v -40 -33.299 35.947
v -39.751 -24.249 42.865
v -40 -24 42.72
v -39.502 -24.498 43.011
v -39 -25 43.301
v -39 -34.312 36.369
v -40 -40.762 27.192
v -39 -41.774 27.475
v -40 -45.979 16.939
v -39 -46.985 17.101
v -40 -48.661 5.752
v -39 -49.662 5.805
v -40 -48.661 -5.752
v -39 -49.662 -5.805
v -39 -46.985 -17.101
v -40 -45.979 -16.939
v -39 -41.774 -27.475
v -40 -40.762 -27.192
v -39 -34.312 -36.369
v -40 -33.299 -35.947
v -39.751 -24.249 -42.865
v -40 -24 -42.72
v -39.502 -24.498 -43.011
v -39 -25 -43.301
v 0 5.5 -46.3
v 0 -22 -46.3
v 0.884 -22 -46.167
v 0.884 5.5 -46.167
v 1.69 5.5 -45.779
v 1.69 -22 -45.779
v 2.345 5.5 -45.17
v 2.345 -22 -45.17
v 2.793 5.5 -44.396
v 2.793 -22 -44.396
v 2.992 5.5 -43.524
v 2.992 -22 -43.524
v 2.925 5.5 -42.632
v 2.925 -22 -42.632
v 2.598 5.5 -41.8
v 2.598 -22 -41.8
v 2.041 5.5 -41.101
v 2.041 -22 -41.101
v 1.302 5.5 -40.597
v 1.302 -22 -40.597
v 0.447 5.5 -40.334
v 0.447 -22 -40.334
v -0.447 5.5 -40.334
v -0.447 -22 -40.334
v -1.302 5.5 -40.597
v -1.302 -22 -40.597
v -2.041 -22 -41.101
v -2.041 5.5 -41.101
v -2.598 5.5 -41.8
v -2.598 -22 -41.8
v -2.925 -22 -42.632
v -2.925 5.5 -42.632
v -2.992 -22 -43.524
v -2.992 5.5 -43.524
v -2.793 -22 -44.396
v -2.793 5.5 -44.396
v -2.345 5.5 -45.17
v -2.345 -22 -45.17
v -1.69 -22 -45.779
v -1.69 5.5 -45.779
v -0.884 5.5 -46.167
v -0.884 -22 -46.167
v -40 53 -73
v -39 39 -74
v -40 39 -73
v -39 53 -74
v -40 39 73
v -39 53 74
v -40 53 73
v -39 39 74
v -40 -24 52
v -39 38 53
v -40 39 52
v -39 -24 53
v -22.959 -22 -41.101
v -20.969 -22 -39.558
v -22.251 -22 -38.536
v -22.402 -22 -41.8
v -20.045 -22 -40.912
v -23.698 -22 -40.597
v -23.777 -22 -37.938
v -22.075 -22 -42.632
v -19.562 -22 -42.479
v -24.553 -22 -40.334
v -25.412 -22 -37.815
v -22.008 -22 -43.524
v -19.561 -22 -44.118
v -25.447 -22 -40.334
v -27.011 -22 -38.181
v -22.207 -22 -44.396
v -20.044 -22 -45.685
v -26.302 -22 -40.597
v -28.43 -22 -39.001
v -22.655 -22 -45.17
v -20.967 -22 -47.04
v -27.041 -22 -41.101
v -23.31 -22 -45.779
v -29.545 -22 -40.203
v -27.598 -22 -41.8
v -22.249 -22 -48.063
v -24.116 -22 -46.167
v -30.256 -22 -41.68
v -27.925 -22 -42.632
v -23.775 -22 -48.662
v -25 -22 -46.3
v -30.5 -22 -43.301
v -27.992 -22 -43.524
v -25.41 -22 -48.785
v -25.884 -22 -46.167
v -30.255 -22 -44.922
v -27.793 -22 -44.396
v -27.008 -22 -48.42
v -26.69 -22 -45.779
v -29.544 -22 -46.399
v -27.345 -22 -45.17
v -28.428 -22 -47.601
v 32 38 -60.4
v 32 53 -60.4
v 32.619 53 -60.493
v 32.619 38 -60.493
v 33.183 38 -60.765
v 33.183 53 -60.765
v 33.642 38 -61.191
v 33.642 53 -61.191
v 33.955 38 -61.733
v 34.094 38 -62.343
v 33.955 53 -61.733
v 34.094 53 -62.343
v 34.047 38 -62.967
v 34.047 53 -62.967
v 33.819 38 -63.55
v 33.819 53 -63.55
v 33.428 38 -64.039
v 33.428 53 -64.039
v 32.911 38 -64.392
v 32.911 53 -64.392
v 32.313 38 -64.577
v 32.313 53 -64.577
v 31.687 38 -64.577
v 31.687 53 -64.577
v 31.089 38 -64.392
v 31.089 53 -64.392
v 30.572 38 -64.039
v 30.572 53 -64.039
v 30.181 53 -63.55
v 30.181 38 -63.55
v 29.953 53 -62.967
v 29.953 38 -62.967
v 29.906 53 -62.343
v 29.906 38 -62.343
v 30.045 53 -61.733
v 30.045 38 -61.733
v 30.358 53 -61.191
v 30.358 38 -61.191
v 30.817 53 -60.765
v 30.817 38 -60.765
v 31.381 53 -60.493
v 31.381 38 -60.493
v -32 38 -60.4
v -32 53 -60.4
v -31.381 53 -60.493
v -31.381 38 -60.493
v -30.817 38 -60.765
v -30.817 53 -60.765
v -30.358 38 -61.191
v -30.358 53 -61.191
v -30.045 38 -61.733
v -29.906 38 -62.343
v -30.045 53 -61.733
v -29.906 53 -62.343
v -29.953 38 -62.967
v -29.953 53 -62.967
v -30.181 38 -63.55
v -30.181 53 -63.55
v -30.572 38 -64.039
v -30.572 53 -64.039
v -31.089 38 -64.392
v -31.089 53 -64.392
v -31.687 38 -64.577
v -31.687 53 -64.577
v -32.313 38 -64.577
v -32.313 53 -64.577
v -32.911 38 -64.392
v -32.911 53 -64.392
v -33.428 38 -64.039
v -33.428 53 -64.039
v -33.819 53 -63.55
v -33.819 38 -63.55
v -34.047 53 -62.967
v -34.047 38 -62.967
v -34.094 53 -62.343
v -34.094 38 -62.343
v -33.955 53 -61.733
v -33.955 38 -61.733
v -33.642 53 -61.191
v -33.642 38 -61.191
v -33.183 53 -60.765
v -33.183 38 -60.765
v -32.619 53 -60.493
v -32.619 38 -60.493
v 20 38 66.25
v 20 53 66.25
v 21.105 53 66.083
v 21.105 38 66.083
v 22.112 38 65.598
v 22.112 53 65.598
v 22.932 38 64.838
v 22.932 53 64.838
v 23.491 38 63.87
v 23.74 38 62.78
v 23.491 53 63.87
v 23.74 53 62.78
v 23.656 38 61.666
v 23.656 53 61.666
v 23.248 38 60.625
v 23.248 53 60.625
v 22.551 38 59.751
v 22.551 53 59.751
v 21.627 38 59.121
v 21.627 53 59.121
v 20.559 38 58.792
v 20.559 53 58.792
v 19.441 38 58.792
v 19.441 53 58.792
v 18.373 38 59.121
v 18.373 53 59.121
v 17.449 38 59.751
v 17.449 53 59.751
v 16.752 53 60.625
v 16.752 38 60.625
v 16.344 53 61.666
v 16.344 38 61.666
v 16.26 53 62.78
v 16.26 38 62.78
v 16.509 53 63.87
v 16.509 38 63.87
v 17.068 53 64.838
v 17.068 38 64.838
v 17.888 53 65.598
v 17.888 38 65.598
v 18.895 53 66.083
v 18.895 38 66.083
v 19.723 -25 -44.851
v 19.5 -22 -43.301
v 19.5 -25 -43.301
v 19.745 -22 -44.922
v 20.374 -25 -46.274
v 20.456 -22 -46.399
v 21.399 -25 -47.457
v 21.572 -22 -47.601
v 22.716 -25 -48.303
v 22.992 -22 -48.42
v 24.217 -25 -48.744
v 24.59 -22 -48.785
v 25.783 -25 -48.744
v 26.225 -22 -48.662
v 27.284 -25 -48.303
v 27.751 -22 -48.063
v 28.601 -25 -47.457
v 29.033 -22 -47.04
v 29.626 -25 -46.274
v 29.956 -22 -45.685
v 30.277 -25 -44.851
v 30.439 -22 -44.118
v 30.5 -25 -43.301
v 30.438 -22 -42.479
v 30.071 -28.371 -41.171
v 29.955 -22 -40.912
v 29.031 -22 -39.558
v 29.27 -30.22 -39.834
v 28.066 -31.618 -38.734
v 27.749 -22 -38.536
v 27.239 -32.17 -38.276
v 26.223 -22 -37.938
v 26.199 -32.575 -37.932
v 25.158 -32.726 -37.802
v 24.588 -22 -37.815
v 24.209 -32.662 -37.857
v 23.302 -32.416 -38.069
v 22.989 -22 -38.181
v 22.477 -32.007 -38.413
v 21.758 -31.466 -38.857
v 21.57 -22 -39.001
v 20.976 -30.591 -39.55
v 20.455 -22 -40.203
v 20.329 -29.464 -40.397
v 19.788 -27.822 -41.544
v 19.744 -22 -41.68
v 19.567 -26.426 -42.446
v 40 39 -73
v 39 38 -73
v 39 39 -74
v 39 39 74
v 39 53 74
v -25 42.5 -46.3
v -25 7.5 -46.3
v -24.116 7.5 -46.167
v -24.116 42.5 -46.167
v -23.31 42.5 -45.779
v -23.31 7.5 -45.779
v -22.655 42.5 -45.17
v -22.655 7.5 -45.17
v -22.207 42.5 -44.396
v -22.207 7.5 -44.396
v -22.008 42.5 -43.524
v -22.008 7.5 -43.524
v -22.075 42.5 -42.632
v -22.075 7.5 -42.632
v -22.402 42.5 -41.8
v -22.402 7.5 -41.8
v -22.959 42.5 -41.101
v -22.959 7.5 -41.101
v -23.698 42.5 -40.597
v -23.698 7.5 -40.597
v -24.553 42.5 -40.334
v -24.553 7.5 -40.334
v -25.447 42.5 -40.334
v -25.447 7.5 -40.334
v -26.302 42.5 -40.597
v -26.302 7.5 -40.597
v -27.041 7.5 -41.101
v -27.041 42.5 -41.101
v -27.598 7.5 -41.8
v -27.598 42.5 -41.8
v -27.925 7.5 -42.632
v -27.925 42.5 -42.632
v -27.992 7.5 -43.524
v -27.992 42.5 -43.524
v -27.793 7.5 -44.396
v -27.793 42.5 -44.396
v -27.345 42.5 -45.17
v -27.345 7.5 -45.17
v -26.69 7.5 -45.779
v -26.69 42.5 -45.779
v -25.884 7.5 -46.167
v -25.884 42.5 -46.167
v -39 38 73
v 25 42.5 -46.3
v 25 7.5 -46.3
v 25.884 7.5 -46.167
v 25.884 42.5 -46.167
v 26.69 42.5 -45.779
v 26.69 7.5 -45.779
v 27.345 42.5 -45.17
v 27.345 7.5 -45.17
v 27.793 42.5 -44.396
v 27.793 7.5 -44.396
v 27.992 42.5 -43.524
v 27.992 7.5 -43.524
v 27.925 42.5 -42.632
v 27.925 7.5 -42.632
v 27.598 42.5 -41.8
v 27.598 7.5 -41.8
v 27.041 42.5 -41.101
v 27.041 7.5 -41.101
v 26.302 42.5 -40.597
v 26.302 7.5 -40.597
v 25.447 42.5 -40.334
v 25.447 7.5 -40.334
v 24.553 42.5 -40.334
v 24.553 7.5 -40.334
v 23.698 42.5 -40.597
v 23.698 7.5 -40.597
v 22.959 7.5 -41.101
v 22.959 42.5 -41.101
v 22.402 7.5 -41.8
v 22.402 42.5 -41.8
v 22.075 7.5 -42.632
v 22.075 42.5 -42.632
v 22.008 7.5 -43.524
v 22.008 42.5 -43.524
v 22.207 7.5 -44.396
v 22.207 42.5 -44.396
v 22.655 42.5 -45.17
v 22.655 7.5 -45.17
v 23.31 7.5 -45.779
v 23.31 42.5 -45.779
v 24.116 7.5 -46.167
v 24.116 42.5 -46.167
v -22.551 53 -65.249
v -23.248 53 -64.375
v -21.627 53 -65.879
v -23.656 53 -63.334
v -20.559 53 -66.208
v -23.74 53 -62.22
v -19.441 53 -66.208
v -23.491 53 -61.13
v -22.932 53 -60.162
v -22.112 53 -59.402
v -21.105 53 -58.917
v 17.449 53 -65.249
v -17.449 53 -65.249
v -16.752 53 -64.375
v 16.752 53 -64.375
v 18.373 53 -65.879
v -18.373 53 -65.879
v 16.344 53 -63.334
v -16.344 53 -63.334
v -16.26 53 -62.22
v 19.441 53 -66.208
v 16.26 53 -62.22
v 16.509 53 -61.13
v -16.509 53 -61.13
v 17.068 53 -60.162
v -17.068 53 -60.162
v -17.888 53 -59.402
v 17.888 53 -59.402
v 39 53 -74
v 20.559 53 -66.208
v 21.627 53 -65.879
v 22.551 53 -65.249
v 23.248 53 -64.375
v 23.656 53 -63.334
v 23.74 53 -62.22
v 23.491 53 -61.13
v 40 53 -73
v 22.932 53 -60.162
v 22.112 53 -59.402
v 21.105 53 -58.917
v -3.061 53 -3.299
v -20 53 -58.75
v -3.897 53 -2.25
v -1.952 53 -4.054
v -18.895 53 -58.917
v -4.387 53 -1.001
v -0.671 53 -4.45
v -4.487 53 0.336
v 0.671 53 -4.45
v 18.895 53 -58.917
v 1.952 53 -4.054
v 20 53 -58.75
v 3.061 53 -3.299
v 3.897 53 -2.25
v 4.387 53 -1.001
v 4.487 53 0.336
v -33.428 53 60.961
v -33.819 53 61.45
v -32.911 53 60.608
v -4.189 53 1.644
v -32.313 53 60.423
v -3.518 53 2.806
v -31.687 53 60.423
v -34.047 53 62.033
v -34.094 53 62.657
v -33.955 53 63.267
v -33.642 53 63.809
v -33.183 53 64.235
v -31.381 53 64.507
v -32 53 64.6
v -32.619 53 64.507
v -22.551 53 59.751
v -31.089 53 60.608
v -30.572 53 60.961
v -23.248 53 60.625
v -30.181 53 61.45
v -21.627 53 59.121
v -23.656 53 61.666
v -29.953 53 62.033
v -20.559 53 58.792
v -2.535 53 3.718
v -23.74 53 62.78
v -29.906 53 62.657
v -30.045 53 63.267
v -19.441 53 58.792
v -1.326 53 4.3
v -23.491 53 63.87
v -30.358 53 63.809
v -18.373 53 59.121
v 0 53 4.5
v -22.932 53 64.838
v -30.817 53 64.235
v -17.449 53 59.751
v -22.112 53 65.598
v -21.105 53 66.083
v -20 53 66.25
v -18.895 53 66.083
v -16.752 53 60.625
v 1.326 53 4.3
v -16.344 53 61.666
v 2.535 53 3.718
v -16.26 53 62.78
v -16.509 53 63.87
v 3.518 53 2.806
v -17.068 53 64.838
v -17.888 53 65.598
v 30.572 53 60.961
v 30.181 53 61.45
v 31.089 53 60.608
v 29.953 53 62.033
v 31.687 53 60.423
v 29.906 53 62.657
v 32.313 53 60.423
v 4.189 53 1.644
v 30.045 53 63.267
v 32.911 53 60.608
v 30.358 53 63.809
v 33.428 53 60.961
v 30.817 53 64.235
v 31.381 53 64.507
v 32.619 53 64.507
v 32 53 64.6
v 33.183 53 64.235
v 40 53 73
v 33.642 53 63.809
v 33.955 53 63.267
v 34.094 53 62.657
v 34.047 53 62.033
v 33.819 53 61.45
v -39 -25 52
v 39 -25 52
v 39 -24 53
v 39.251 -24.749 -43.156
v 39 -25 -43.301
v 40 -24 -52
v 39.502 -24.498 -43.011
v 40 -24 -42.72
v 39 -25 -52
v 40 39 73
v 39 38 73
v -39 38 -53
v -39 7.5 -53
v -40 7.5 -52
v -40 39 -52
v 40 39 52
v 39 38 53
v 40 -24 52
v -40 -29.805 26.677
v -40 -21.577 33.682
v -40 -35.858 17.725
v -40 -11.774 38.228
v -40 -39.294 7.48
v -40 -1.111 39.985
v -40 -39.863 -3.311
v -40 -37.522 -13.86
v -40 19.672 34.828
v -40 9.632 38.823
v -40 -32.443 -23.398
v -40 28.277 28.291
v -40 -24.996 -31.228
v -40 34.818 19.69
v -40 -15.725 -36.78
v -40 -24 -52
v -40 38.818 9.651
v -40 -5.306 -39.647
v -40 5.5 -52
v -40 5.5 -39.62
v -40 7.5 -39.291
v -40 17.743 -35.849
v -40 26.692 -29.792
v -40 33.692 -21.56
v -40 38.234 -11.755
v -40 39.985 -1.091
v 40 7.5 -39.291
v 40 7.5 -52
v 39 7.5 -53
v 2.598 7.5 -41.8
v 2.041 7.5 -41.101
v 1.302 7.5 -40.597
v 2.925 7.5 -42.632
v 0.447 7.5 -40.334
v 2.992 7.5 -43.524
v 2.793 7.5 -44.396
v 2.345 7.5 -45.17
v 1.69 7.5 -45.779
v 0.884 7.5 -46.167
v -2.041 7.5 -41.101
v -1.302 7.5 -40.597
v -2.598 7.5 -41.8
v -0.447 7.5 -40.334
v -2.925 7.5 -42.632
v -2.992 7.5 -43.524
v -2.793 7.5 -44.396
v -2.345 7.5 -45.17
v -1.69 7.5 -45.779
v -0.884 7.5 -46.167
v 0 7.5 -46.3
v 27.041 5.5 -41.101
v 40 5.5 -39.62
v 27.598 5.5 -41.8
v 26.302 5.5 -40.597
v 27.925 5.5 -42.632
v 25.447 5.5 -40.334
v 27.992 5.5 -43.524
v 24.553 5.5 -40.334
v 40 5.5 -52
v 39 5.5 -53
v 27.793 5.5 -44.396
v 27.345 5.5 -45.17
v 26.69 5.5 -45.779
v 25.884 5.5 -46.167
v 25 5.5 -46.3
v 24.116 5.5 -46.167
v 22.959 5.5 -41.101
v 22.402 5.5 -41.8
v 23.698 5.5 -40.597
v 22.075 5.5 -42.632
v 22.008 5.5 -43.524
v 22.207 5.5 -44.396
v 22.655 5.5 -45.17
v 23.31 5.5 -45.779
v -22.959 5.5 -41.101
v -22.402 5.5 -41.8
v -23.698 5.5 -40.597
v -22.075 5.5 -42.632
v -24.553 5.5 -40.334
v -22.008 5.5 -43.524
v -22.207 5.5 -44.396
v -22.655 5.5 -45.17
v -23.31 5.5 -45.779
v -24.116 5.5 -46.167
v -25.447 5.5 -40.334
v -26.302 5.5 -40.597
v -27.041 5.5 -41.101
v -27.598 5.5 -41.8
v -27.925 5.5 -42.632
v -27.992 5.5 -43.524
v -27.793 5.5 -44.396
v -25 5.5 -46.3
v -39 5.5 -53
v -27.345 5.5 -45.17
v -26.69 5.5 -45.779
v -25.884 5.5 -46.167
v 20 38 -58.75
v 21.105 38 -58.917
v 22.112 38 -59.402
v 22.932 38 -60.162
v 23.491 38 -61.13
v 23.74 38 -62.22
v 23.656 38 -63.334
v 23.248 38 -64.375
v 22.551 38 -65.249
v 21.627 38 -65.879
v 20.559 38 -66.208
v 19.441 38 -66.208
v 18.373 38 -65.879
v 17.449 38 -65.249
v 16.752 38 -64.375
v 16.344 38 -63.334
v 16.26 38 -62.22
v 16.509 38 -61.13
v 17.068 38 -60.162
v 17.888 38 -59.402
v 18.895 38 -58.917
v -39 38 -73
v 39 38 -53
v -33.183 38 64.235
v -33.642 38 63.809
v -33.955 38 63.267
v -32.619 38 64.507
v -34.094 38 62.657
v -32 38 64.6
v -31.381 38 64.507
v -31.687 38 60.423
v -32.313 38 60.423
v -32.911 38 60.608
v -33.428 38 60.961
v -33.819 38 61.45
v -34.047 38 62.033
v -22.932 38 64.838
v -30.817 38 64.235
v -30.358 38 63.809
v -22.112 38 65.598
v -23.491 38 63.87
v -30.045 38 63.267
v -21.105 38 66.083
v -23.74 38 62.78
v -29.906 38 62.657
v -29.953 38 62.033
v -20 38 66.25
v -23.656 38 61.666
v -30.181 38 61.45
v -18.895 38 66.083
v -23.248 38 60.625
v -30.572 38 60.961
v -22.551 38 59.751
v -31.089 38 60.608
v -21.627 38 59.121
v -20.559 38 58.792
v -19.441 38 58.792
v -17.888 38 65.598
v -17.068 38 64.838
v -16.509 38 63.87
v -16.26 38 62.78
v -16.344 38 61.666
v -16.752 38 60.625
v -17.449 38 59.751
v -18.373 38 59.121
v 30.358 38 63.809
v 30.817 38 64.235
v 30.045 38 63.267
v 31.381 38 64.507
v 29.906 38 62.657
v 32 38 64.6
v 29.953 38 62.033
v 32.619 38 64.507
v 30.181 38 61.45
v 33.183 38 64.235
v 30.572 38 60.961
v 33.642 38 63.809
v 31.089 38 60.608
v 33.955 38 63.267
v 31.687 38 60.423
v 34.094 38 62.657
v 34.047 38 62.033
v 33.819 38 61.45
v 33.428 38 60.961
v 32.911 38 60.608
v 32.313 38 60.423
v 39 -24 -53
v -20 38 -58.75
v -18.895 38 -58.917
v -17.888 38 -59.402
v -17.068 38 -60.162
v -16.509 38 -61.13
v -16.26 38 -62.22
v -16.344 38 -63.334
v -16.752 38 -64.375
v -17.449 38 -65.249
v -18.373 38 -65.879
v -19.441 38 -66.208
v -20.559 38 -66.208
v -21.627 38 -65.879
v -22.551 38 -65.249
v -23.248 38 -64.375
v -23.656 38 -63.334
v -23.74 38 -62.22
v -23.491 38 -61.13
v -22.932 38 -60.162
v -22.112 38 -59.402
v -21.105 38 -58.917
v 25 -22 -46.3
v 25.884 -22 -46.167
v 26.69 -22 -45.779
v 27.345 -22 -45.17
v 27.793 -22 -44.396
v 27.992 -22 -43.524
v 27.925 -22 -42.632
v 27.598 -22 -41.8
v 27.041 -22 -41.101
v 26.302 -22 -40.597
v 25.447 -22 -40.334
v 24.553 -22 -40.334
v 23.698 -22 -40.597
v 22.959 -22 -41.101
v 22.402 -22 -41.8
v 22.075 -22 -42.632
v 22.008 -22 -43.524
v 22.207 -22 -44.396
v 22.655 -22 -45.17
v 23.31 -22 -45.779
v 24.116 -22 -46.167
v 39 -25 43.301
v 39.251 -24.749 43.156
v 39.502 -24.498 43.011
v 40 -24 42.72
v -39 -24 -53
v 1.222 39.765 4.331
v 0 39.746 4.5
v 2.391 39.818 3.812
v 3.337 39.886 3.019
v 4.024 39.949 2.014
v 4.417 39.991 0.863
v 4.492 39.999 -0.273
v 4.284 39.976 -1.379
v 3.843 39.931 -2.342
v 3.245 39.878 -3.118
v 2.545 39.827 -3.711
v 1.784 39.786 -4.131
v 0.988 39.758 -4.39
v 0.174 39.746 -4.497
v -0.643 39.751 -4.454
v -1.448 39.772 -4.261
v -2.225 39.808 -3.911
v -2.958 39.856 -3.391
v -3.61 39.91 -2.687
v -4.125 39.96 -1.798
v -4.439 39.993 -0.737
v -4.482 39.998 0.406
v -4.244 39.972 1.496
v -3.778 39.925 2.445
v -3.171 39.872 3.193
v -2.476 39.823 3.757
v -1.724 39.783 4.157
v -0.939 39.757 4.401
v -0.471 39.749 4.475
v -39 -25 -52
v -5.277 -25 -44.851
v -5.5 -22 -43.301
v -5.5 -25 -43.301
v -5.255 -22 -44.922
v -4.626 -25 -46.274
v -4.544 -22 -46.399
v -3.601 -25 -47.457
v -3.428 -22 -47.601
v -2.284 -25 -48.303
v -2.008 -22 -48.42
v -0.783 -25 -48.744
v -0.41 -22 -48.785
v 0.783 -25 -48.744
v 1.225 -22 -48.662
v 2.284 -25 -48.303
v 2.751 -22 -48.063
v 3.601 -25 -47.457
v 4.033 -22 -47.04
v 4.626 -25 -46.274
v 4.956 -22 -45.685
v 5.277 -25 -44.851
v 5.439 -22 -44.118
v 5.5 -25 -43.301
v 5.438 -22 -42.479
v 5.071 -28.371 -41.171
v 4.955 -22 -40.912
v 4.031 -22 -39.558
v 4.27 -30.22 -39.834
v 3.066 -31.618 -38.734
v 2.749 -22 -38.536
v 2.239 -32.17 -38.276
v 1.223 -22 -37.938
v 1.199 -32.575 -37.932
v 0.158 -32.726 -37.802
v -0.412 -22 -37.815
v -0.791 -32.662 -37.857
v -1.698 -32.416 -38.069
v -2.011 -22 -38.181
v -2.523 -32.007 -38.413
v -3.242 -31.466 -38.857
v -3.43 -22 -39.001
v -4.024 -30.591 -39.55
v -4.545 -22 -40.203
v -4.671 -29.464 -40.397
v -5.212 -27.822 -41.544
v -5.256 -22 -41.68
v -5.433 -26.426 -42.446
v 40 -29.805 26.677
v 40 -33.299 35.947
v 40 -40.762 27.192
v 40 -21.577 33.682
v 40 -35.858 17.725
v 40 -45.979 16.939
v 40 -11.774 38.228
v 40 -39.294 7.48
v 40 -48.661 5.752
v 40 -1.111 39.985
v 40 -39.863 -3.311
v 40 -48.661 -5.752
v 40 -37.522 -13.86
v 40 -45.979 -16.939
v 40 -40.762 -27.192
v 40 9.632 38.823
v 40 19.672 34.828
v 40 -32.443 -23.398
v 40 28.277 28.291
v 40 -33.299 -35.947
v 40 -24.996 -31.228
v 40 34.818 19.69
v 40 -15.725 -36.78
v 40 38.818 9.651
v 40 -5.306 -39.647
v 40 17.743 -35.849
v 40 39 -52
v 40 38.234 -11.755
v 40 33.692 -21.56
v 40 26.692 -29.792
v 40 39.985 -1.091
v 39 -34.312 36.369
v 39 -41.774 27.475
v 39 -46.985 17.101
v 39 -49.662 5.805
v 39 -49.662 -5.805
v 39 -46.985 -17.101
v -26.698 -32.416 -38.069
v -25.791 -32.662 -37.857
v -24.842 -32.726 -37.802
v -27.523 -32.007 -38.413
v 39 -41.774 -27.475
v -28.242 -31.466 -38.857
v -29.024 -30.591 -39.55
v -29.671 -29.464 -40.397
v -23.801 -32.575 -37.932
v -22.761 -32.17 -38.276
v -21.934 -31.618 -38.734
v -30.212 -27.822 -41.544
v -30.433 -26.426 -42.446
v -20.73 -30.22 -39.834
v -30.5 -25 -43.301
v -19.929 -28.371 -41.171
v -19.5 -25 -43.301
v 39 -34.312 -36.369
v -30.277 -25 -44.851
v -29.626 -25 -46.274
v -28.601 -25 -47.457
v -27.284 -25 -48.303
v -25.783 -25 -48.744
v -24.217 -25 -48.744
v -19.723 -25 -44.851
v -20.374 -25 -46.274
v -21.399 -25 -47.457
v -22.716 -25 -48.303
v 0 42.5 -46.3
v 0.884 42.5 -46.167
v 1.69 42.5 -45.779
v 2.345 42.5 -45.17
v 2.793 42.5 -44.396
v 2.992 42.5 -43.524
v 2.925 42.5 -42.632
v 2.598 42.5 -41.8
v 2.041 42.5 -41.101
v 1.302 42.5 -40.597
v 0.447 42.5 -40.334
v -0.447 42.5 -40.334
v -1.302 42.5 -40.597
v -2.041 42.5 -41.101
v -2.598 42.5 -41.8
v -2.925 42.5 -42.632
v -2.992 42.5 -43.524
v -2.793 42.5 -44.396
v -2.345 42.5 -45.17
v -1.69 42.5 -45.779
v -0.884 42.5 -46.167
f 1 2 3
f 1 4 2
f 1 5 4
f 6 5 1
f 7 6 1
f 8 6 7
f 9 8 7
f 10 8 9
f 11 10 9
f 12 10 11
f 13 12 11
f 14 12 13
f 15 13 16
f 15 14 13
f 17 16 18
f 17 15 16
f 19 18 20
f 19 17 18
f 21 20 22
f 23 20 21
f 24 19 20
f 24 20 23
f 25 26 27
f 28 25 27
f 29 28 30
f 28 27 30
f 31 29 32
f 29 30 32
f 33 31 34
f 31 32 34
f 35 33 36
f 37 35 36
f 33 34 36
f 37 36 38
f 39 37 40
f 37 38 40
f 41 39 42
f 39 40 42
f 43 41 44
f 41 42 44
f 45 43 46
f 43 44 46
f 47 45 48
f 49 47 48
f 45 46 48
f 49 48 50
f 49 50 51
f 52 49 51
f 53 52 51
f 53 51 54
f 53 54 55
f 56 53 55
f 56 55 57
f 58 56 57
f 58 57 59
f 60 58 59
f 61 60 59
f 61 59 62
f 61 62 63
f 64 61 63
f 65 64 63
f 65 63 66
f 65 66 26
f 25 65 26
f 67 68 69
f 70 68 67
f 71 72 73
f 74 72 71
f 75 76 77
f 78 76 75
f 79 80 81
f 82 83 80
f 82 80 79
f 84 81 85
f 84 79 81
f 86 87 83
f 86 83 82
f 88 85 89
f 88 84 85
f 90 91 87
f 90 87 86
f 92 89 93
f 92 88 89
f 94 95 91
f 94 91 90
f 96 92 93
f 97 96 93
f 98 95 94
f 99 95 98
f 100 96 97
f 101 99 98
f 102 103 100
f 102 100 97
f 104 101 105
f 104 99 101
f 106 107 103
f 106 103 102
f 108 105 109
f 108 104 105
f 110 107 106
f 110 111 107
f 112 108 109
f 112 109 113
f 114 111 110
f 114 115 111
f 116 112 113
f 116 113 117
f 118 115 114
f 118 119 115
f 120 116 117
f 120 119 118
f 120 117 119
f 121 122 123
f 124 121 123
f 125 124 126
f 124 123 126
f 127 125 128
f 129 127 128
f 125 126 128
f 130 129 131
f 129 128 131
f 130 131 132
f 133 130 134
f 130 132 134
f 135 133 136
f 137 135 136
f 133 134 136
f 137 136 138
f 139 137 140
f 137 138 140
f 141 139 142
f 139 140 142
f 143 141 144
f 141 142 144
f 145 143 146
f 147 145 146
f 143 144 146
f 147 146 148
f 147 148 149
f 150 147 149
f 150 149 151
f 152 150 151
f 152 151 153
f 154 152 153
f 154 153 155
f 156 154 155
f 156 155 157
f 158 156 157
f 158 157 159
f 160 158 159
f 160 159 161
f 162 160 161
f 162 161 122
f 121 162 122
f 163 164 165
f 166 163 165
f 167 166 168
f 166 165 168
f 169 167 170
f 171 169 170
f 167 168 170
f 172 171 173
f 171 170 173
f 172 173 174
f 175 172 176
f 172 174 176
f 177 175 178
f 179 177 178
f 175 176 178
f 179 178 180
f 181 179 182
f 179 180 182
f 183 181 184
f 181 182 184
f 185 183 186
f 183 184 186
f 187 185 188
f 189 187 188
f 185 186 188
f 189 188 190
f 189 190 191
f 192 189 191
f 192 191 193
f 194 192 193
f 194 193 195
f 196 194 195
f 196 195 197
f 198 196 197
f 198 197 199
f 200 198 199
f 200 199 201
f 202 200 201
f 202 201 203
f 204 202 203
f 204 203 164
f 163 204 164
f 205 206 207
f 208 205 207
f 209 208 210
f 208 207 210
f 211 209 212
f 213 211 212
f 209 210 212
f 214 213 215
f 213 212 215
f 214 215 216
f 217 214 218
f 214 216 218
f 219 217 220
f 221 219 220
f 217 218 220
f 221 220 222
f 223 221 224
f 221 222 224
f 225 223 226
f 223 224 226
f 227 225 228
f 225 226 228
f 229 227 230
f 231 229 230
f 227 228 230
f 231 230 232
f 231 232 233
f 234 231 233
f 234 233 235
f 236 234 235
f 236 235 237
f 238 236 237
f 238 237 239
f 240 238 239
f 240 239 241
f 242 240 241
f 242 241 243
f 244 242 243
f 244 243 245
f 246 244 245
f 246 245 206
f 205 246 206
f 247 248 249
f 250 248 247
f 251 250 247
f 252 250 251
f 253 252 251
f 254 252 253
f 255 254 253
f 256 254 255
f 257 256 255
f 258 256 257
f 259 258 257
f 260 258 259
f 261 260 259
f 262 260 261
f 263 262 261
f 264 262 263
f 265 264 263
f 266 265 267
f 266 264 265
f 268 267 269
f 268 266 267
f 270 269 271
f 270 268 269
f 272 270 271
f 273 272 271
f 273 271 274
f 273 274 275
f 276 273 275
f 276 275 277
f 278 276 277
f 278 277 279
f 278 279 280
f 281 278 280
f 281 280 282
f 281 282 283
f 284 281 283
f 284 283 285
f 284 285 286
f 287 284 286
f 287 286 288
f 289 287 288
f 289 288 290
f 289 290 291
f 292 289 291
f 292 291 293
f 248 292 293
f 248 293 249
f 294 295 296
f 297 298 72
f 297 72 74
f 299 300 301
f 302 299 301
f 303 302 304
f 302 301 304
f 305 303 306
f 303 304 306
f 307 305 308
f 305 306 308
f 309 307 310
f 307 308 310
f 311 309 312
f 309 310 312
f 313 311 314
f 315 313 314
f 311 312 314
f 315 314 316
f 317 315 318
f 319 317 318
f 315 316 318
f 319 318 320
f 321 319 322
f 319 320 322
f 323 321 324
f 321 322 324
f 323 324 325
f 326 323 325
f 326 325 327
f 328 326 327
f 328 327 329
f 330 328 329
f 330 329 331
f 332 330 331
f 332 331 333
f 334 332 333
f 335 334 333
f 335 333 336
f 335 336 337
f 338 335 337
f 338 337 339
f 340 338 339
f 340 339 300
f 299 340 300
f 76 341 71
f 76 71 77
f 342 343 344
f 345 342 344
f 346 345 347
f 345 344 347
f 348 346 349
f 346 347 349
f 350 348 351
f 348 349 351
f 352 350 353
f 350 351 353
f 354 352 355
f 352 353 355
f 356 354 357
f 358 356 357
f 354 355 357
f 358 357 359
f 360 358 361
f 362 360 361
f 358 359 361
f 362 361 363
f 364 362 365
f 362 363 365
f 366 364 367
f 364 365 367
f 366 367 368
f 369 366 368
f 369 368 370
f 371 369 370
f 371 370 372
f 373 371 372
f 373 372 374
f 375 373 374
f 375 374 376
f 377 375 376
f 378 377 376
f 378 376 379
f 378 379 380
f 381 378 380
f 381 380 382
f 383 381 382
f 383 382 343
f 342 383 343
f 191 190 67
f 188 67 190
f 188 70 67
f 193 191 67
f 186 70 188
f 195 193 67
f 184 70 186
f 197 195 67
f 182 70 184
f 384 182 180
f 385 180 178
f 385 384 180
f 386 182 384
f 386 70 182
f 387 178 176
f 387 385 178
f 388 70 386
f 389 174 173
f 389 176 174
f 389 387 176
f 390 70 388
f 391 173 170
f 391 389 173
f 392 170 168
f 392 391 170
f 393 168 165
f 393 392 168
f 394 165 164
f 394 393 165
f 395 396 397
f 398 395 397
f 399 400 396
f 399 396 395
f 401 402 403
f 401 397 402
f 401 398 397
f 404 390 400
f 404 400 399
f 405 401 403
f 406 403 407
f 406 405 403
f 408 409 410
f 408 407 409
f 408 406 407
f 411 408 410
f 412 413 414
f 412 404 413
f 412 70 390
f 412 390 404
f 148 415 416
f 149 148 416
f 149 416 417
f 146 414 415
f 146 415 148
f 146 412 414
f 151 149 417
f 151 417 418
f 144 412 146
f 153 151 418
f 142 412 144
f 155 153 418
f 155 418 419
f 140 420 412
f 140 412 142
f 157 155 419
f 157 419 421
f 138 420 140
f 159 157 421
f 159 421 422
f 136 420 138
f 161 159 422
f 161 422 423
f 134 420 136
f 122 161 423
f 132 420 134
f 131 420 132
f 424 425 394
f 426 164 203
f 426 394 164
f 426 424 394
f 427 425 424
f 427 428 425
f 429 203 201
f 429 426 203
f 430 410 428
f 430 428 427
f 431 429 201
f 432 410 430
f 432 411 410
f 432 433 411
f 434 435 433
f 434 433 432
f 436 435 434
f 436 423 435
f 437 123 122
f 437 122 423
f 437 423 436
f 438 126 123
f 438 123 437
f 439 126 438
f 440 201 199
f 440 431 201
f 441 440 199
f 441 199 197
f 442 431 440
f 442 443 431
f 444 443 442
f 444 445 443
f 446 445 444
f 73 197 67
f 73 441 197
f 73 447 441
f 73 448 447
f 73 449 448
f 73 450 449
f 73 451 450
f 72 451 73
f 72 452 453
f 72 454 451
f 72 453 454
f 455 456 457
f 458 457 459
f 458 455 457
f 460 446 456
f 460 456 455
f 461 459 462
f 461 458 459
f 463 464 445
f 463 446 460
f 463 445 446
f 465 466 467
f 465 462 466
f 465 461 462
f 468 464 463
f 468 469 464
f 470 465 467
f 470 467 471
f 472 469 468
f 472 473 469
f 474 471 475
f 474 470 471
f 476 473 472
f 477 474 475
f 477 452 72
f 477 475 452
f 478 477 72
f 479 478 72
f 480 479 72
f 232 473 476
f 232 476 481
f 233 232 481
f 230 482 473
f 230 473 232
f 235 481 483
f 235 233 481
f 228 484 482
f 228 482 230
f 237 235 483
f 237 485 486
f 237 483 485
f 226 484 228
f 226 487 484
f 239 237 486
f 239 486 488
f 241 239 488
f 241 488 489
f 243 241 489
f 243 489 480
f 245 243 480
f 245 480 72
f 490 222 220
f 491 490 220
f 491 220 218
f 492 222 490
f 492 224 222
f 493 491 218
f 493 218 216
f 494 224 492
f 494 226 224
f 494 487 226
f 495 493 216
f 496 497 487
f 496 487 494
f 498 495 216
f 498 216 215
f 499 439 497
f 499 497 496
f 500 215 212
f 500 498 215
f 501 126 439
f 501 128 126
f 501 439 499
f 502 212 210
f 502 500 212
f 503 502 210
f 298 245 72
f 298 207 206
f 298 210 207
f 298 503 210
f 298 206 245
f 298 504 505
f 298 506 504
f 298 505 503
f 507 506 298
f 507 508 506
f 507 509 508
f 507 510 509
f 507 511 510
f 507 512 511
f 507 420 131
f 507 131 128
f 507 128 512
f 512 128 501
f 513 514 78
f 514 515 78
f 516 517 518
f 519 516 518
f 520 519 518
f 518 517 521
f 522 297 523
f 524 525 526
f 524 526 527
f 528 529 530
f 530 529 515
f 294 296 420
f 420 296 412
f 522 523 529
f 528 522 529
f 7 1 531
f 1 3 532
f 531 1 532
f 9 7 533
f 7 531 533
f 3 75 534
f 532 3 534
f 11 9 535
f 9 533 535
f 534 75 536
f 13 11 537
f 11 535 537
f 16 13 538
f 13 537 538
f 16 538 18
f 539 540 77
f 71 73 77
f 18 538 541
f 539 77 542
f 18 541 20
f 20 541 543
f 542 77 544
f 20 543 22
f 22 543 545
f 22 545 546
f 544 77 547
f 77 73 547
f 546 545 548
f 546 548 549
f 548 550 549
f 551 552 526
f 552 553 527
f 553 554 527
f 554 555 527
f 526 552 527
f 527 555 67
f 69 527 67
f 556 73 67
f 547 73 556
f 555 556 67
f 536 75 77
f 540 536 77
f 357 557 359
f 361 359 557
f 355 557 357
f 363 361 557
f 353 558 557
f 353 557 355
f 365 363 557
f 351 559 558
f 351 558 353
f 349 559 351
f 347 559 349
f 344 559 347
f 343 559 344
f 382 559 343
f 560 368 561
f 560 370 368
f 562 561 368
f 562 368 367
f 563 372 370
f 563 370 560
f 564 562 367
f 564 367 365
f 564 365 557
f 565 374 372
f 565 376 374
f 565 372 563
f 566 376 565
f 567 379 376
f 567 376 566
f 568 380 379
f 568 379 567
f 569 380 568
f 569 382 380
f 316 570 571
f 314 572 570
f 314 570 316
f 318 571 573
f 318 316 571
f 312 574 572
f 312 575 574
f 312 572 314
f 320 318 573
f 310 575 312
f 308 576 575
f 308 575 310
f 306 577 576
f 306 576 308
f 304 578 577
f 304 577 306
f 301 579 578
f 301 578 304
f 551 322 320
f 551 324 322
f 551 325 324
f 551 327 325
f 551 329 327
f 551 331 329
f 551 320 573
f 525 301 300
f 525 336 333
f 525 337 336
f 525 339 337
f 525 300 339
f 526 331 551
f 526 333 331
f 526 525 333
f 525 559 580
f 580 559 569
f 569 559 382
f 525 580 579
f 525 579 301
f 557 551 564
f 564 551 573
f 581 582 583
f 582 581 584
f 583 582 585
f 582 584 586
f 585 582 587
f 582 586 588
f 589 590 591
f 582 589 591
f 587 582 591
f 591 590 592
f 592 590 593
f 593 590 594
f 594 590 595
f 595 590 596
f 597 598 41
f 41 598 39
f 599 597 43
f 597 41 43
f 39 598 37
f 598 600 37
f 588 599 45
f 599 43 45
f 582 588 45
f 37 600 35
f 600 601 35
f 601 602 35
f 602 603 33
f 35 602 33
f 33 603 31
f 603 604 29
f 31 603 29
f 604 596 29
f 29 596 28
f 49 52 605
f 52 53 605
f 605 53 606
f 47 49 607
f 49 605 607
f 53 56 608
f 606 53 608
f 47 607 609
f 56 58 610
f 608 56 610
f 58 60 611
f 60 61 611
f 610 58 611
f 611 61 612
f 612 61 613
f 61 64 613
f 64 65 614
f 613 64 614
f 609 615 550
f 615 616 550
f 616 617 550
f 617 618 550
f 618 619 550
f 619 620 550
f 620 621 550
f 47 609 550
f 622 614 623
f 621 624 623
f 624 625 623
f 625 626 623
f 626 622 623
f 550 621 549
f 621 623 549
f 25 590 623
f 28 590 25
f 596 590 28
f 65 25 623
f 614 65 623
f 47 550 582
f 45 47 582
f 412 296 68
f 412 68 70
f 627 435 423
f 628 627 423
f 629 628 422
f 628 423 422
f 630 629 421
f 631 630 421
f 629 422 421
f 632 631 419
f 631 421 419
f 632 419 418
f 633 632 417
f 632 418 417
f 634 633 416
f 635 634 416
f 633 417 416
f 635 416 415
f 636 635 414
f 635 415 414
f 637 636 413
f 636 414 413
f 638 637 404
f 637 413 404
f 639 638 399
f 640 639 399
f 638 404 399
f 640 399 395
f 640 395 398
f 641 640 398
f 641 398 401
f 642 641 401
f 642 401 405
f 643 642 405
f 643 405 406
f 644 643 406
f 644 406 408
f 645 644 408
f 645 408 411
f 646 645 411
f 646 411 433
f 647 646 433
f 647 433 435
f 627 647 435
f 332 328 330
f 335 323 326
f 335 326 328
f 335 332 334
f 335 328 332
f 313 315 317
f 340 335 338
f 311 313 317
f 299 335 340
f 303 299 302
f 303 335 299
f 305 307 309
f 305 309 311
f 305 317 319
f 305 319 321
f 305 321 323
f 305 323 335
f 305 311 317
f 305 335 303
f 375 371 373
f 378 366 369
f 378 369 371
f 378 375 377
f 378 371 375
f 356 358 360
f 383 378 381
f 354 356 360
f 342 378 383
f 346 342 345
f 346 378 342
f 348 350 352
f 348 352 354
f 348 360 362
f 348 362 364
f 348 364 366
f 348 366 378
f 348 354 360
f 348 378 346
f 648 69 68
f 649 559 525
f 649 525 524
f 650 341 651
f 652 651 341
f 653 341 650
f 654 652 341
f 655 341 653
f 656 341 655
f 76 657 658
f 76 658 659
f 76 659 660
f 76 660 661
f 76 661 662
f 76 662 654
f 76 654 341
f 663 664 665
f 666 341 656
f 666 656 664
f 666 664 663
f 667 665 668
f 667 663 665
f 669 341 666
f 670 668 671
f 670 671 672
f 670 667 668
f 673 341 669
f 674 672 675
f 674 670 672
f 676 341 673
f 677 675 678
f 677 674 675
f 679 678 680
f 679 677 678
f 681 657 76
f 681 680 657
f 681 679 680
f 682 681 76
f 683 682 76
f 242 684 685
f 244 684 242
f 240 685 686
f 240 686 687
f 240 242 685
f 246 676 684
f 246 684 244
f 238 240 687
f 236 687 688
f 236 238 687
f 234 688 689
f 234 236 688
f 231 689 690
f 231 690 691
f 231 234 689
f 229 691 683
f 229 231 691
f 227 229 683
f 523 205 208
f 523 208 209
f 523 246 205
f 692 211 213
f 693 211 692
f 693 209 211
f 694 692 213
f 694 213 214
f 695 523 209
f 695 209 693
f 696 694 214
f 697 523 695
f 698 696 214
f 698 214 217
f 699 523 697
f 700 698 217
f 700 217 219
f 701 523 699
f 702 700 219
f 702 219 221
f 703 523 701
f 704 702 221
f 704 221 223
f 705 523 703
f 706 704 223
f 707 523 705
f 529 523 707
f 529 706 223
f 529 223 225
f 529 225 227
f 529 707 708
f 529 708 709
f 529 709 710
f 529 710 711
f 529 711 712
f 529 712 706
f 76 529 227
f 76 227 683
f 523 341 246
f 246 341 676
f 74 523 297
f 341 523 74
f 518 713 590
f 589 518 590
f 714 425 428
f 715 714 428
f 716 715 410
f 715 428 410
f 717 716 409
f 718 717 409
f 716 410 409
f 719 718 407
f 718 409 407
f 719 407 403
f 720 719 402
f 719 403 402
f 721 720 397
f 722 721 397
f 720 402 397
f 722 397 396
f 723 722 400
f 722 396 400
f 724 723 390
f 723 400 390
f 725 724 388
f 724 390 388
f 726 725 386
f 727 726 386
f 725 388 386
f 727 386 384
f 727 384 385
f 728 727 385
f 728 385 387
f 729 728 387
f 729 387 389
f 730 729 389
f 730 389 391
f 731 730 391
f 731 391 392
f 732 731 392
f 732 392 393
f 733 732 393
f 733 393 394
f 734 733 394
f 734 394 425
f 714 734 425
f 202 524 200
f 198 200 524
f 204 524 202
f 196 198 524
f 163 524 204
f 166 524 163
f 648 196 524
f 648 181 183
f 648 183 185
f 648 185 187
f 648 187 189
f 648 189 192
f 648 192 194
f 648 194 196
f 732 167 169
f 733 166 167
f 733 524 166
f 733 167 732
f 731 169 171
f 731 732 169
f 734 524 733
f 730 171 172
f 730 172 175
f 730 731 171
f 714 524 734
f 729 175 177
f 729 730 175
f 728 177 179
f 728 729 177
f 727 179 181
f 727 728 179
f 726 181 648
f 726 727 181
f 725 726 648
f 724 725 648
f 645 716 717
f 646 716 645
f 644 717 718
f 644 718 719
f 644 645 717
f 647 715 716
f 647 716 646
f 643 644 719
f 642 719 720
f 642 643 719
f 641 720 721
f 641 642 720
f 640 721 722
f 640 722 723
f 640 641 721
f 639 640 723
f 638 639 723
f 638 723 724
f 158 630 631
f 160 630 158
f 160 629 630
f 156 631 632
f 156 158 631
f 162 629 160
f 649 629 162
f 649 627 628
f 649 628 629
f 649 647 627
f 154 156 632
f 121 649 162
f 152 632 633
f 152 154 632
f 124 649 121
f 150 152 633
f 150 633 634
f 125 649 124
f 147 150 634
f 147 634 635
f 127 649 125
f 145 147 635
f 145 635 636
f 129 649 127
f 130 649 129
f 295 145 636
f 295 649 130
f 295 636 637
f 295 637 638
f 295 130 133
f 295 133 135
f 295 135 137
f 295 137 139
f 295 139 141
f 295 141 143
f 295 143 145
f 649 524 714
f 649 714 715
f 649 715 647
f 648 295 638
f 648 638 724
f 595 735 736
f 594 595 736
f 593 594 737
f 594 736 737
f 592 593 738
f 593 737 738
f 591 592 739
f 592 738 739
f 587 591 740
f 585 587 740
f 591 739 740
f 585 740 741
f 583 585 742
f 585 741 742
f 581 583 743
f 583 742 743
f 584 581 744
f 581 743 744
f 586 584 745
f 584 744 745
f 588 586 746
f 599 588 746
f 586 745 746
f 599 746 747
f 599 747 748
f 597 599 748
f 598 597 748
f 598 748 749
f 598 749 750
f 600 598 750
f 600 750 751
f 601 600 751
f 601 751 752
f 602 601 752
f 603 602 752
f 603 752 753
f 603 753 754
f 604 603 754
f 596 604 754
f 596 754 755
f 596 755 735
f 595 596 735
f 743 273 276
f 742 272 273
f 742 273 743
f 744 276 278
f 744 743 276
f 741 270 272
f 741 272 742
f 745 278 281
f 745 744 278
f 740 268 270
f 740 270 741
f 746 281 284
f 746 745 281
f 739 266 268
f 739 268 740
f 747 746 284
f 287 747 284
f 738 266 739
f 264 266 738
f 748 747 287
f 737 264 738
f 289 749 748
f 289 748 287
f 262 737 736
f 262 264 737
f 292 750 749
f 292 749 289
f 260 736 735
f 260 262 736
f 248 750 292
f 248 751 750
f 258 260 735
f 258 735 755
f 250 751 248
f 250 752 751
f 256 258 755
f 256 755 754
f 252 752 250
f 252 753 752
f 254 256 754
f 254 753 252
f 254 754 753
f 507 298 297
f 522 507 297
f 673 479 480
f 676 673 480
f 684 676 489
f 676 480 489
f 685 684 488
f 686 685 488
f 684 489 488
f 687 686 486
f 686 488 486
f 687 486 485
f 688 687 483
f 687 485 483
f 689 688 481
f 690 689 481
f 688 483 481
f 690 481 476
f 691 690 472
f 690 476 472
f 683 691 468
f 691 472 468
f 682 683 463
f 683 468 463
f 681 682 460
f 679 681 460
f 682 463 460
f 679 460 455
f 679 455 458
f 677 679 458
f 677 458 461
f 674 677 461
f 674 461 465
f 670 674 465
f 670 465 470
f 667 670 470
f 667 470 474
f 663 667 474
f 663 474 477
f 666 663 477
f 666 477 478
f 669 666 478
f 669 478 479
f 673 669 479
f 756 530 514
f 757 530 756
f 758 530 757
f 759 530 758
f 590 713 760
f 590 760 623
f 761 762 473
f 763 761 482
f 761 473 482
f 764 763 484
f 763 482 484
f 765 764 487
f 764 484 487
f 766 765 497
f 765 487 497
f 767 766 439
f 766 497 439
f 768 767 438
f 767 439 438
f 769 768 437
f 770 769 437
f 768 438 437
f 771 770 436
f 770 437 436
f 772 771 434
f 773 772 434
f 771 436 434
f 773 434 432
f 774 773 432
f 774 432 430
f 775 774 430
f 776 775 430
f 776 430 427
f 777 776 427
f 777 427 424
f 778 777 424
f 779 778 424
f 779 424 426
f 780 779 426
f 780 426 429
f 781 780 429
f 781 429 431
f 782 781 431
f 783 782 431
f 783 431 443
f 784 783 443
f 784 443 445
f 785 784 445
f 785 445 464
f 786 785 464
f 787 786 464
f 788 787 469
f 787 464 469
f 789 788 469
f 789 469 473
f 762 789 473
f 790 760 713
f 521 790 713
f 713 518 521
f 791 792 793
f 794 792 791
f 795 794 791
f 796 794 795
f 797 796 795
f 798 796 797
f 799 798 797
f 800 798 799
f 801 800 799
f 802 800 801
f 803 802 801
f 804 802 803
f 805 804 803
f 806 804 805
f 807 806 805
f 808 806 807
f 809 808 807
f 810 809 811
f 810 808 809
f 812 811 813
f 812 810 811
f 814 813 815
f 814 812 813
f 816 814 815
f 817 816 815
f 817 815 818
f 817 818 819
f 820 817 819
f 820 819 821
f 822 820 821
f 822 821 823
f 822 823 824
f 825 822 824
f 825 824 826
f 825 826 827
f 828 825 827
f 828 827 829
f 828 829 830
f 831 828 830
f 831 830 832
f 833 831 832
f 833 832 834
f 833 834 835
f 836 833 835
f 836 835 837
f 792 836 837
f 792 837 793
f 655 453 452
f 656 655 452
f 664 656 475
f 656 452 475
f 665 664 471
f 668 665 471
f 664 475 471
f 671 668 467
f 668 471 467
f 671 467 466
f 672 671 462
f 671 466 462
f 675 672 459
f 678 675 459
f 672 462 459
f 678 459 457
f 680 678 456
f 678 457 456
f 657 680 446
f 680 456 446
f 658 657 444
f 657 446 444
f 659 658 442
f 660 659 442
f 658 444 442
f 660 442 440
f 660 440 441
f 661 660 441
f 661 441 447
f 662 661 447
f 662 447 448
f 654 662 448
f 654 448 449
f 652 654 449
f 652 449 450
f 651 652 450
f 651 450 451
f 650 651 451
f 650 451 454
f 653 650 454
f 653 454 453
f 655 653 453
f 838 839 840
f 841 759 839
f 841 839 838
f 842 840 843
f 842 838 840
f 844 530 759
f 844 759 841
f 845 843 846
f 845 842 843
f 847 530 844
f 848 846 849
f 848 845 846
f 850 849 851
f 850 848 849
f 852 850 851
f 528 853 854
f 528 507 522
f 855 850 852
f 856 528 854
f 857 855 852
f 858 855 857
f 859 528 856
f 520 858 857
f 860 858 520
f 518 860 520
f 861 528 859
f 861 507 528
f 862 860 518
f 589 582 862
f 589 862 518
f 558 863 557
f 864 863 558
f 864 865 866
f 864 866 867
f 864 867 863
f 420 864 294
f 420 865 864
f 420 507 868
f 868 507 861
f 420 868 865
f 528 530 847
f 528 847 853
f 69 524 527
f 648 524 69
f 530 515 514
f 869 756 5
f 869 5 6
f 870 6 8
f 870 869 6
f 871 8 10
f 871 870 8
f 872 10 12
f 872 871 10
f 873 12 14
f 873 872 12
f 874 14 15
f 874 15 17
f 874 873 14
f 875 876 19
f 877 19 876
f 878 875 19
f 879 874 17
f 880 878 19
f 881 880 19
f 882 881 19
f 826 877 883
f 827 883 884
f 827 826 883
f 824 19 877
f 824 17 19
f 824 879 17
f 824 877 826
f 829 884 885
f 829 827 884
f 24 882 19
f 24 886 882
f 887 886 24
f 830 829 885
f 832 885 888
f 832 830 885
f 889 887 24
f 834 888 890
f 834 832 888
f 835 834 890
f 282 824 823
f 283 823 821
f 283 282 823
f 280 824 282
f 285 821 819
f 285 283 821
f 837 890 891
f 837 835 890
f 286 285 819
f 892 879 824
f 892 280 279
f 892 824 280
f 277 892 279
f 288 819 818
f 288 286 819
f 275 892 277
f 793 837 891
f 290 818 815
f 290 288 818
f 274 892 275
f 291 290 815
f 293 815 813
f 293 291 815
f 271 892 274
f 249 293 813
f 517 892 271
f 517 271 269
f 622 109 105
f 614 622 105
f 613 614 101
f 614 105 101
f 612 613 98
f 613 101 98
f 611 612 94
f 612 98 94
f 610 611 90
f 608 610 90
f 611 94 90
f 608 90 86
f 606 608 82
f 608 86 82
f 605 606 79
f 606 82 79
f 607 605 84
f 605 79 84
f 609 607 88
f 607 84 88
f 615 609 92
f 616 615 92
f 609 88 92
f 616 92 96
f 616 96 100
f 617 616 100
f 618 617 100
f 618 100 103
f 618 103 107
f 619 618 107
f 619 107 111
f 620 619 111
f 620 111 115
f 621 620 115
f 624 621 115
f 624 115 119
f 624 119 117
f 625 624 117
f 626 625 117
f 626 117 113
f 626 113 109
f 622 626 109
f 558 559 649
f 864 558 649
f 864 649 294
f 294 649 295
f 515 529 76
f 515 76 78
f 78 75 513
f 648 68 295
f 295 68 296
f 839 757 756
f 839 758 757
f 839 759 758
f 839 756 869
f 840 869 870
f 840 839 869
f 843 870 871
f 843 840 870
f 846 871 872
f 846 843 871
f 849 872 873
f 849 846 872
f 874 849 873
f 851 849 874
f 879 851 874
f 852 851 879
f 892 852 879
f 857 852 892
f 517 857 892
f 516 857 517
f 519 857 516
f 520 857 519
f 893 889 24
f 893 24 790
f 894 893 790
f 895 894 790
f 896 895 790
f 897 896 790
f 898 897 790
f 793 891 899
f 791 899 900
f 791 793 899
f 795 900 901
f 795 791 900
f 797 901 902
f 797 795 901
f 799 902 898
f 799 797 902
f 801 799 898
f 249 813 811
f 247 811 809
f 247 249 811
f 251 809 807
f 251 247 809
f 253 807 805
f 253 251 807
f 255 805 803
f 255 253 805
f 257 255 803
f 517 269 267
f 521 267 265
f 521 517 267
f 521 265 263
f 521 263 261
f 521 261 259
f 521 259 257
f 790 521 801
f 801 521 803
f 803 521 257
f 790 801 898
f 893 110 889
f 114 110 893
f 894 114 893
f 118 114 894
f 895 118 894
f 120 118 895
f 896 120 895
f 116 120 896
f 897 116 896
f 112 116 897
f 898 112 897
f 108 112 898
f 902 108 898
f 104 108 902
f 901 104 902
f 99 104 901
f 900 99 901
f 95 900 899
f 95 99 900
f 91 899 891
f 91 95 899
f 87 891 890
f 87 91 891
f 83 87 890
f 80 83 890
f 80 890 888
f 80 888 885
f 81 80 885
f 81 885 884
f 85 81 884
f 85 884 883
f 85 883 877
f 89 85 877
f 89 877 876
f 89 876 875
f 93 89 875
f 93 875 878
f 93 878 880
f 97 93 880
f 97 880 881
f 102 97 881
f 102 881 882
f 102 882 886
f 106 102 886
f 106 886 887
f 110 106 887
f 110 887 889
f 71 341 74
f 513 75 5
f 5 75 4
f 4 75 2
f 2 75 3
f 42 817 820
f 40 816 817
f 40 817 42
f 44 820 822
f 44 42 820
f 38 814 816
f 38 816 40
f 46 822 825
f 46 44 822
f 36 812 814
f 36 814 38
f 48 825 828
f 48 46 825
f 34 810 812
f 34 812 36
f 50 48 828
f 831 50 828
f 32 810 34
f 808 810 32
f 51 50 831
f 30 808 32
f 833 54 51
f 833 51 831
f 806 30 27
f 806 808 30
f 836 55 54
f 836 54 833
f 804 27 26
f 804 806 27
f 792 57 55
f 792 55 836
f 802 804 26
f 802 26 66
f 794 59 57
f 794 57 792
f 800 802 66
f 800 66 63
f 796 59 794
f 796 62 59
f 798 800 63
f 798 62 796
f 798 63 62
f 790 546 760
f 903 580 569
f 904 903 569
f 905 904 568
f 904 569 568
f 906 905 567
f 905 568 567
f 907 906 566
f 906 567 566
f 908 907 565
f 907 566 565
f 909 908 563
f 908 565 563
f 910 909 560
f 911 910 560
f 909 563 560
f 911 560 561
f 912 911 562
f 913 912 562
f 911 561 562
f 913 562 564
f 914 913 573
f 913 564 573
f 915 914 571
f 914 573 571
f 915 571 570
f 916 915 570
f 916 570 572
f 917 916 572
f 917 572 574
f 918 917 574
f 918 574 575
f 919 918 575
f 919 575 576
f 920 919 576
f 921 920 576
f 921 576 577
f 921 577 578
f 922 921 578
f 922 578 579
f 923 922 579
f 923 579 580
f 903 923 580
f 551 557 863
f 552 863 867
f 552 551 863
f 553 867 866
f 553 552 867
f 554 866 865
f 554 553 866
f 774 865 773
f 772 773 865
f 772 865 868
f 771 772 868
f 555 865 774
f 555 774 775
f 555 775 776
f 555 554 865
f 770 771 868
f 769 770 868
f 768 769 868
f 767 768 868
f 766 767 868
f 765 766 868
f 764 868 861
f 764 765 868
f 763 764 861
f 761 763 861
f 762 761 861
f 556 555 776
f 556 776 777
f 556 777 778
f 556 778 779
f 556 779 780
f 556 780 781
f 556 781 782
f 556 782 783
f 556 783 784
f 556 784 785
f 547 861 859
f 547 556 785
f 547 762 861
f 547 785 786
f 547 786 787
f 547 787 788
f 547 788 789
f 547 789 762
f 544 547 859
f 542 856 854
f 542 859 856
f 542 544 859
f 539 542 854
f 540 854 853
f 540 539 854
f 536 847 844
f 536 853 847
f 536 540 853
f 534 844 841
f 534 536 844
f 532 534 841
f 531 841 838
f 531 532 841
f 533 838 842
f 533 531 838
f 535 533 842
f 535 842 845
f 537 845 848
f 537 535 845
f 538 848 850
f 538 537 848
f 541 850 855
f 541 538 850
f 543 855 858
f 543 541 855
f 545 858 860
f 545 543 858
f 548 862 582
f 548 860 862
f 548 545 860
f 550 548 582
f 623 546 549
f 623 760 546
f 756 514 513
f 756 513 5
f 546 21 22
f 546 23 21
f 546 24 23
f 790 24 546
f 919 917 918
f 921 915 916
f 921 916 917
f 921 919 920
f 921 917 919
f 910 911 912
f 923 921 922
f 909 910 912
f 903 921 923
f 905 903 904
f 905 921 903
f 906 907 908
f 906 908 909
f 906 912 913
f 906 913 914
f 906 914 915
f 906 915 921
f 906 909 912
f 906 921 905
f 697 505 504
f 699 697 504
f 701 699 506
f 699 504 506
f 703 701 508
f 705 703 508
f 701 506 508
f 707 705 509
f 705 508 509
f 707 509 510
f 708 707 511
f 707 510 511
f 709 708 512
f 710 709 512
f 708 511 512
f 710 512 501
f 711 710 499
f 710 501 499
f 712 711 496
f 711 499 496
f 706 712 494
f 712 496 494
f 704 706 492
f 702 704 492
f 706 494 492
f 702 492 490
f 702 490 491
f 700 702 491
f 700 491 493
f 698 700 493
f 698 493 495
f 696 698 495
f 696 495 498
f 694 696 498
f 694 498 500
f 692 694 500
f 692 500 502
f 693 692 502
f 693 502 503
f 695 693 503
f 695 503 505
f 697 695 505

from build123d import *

# Parameters (mm, degrees)
SKETCH1_R           = 40
BOSS_EXTRUDE1_DEPTH = 40
SKETCH2_W           = 80
SKETCH2_H           = 2
CUT_EXTRUDE1_DEPTH  = 19
CUT_EXTRUDE2_START  = -3
SKETCH3_R           = 5.5
CUT_EXTRUDE2_DEPTH  = 118.717043198
SKETCH4_R           = 3
CUT_EXTRUDE3_DEPTH  = 64.5
LPATTERN1_COUNT     = 3
LPATTERN1_PITCH     = 25
SKETCH5_R           = 4.5
SKETCH5_R_2         = 2.1
SKETCH5_R_3         = 3.75
CUT_EXTRUDE4_DEPTH  = 24.5
CHAMFER1_SIZE       = 1


with BuildPart() as part:
    # Sketch1 → Boss-Extrude1 (new, symmetric)
    with BuildSketch(Plane(origin=(0, 0, 0), x_dir=(0, 0, -1), z_dir=(1, 0, 0))):
        with BuildLine():
            Line((-53, -25), (-43.301270189, -25))
            ThreePointArc((-43.301270189, -25), (0, -50), (43.301270189, -25))
            Line((43.301270189, -25), (53, -25))
            Line((53, -25), (53, 38))
            Line((53, 38), (74, 38))
            Line((74, 38), (74, 53))
            Line((74, 53), (-74, 53))
            Line((-74, 53), (-74, 38))
            Line((-74, 38), (-53, 38))
            Line((-53, 38), (-53, -25))
        make_face()
        Circle(SKETCH1_R, mode=Mode.SUBTRACT)
    extrude(amount=BOSS_EXTRUDE1_DEPTH, both=True)

    # Sketch2 → Cut-Extrude1 (cut)
    with BuildSketch(Plane(origin=(0, 0, -53), x_dir=(-1, 0, 0), z_dir=(0, 0, -1))):
        with Locations((0, 6.5)):
            Rectangle(SKETCH2_W, SKETCH2_H)
    extrude(amount=-CUT_EXTRUDE1_DEPTH, mode=Mode.SUBTRACT)

    # Sketch3 → Cut-Extrude2 (cut, through all)
    with BuildSketch(Plane.XZ.offset(25).offset(CUT_EXTRUDE2_START)):
        with Locations(Location((25.000000054, -43.3, 0), (0, 0, 180.013232088))):
            Circle(SKETCH3_R)
    cut_extrude2 = extrude(amount=CUT_EXTRUDE2_DEPTH, mode=Mode.SUBTRACT)

    # Sketch4 → Cut-Extrude3 (cut)
    with BuildSketch(Plane.XZ.offset(22)):
        with Locations(Location((25.000000054, -43.3, 0), (0, 0, 270))):
            Circle(SKETCH4_R)
    cut_extrude3 = extrude(amount=-CUT_EXTRUDE3_DEPTH, mode=Mode.SUBTRACT)

    # LPattern1: Cut-Extrude2, Cut-Extrude3 ×3
    with Locations(*[(-i * LPATTERN1_PITCH, 0, 0) for i in range(1, LPATTERN1_COUNT)]):
        add(cut_extrude2, mode=Mode.SUBTRACT)
        add(cut_extrude3, mode=Mode.SUBTRACT)

    # Sketch5 → Cut-Extrude4 (cut)
    with BuildSketch(Plane(origin=(0, 53, 0), x_dir=(1, 0, 0), z_dir=(0, 1, 0))):
        with Locations(Location((0, 0, 0), (0, 0, 270))):
            Circle(SKETCH5_R)
        with Locations(Location((-32, 62.5, 0), (0, 0, 270))):
            Circle(SKETCH5_R_2)
        with Locations(Location((-20, 62.5, 0), (0, 0, 270))):
            Circle(SKETCH5_R_3)
        with Locations(Location((32, 62.5, 0), (0, 0, 270))):
            Circle(SKETCH5_R_2)
        with Locations(Location((20, 62.5, 0), (0, 0, 270))):
            Circle(SKETCH5_R_3)
        with Locations(Location((32, -62.5, 0), (0, 0, 270))):
            Circle(SKETCH5_R_2)
        with Locations(Location((20, -62.5, 0), (0, 0, 270))):
            Circle(SKETCH5_R_3)
        with Locations(Location((-20, -62.5, 0), (0, 0, 270))):
            Circle(SKETCH5_R_3)
        with Locations(Location((-32, -62.5, 0), (0, 0, 270))):
            Circle(SKETCH5_R_2)
    extrude(amount=-CUT_EXTRUDE4_DEPTH, mode=Mode.SUBTRACT)

    # Chamfer1
    chamfer1_edges = [part.edges().sort_by_distance(p)[0] for p in [
        (40, -50, 0),
        (-40, 45.5, -74),
        (-40, 38, -63.5),
        (-40, -9.75, -53),
        (-40, -25, -48.150635095),
        (-40, -50, 0),
        (-40, -25, 48.150635095),
        (-40, 6.5, 53),
        (40, -25, -48.150635095),
        (40, -9.75, -53),
        (0, 38, 74),
        (0, 38, -74),
        (0, -25, -53),
        (0, -25, 53),
        (40, 38, -63.5),
        (40, 45.5, -74),
        (40, 45.5, 74),
        (40, 38, 63.5),
        (-40, 22.75, -53),
        (40, 22.75, -53),
        (40, 6.5, 53),
        (40, -25, 48.150635095),
        (-40, 38, 63.5),
        (-40, 45.5, 74),
    ]]
    chamfer(chamfer1_edges, length=CHAMFER1_SIZE)


solid = part.part
